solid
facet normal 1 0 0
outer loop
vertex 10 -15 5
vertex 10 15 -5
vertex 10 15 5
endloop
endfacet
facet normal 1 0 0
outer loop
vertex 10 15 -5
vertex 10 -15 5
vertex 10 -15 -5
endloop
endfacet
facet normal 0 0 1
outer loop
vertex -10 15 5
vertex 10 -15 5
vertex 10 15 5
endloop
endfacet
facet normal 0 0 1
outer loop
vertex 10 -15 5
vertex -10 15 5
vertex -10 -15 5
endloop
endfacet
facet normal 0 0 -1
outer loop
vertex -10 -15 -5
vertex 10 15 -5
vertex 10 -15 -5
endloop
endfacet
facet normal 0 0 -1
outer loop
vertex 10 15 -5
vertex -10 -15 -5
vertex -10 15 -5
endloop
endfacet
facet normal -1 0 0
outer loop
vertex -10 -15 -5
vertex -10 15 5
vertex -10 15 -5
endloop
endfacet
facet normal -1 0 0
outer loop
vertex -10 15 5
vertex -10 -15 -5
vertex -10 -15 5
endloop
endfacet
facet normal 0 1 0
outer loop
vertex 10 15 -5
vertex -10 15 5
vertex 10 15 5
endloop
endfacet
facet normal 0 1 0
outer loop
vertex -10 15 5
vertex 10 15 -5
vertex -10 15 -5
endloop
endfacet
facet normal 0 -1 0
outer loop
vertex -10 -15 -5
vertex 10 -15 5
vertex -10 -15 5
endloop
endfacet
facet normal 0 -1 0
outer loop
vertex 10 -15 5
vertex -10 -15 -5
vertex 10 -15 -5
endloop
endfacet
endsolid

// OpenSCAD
// Which one would you like to see?
part = "all"; // [first:External piece,second:Internal piece,all:Both]
/* [Dimensions */
width = 20;
height = 10;
length = 30;

module color1(){
    difference(){
        cube([width,length,height],center=true);
        rotate([45,0,0]) cube([width,length,height],center=true);
    }
}
module color2(){
    intersection(){
        cube([width,length,height],center=true);
        rotate([45,0,0]) cube([width,length,height],center=true);
    }
}
print_part();

module print_part(){
    if(part=="first"){
       color1(); 
    }
    else if(part=="second"){
        color2();
    }
    else if(part=="all"){
        color1(); 
        color2();
    }
} 


